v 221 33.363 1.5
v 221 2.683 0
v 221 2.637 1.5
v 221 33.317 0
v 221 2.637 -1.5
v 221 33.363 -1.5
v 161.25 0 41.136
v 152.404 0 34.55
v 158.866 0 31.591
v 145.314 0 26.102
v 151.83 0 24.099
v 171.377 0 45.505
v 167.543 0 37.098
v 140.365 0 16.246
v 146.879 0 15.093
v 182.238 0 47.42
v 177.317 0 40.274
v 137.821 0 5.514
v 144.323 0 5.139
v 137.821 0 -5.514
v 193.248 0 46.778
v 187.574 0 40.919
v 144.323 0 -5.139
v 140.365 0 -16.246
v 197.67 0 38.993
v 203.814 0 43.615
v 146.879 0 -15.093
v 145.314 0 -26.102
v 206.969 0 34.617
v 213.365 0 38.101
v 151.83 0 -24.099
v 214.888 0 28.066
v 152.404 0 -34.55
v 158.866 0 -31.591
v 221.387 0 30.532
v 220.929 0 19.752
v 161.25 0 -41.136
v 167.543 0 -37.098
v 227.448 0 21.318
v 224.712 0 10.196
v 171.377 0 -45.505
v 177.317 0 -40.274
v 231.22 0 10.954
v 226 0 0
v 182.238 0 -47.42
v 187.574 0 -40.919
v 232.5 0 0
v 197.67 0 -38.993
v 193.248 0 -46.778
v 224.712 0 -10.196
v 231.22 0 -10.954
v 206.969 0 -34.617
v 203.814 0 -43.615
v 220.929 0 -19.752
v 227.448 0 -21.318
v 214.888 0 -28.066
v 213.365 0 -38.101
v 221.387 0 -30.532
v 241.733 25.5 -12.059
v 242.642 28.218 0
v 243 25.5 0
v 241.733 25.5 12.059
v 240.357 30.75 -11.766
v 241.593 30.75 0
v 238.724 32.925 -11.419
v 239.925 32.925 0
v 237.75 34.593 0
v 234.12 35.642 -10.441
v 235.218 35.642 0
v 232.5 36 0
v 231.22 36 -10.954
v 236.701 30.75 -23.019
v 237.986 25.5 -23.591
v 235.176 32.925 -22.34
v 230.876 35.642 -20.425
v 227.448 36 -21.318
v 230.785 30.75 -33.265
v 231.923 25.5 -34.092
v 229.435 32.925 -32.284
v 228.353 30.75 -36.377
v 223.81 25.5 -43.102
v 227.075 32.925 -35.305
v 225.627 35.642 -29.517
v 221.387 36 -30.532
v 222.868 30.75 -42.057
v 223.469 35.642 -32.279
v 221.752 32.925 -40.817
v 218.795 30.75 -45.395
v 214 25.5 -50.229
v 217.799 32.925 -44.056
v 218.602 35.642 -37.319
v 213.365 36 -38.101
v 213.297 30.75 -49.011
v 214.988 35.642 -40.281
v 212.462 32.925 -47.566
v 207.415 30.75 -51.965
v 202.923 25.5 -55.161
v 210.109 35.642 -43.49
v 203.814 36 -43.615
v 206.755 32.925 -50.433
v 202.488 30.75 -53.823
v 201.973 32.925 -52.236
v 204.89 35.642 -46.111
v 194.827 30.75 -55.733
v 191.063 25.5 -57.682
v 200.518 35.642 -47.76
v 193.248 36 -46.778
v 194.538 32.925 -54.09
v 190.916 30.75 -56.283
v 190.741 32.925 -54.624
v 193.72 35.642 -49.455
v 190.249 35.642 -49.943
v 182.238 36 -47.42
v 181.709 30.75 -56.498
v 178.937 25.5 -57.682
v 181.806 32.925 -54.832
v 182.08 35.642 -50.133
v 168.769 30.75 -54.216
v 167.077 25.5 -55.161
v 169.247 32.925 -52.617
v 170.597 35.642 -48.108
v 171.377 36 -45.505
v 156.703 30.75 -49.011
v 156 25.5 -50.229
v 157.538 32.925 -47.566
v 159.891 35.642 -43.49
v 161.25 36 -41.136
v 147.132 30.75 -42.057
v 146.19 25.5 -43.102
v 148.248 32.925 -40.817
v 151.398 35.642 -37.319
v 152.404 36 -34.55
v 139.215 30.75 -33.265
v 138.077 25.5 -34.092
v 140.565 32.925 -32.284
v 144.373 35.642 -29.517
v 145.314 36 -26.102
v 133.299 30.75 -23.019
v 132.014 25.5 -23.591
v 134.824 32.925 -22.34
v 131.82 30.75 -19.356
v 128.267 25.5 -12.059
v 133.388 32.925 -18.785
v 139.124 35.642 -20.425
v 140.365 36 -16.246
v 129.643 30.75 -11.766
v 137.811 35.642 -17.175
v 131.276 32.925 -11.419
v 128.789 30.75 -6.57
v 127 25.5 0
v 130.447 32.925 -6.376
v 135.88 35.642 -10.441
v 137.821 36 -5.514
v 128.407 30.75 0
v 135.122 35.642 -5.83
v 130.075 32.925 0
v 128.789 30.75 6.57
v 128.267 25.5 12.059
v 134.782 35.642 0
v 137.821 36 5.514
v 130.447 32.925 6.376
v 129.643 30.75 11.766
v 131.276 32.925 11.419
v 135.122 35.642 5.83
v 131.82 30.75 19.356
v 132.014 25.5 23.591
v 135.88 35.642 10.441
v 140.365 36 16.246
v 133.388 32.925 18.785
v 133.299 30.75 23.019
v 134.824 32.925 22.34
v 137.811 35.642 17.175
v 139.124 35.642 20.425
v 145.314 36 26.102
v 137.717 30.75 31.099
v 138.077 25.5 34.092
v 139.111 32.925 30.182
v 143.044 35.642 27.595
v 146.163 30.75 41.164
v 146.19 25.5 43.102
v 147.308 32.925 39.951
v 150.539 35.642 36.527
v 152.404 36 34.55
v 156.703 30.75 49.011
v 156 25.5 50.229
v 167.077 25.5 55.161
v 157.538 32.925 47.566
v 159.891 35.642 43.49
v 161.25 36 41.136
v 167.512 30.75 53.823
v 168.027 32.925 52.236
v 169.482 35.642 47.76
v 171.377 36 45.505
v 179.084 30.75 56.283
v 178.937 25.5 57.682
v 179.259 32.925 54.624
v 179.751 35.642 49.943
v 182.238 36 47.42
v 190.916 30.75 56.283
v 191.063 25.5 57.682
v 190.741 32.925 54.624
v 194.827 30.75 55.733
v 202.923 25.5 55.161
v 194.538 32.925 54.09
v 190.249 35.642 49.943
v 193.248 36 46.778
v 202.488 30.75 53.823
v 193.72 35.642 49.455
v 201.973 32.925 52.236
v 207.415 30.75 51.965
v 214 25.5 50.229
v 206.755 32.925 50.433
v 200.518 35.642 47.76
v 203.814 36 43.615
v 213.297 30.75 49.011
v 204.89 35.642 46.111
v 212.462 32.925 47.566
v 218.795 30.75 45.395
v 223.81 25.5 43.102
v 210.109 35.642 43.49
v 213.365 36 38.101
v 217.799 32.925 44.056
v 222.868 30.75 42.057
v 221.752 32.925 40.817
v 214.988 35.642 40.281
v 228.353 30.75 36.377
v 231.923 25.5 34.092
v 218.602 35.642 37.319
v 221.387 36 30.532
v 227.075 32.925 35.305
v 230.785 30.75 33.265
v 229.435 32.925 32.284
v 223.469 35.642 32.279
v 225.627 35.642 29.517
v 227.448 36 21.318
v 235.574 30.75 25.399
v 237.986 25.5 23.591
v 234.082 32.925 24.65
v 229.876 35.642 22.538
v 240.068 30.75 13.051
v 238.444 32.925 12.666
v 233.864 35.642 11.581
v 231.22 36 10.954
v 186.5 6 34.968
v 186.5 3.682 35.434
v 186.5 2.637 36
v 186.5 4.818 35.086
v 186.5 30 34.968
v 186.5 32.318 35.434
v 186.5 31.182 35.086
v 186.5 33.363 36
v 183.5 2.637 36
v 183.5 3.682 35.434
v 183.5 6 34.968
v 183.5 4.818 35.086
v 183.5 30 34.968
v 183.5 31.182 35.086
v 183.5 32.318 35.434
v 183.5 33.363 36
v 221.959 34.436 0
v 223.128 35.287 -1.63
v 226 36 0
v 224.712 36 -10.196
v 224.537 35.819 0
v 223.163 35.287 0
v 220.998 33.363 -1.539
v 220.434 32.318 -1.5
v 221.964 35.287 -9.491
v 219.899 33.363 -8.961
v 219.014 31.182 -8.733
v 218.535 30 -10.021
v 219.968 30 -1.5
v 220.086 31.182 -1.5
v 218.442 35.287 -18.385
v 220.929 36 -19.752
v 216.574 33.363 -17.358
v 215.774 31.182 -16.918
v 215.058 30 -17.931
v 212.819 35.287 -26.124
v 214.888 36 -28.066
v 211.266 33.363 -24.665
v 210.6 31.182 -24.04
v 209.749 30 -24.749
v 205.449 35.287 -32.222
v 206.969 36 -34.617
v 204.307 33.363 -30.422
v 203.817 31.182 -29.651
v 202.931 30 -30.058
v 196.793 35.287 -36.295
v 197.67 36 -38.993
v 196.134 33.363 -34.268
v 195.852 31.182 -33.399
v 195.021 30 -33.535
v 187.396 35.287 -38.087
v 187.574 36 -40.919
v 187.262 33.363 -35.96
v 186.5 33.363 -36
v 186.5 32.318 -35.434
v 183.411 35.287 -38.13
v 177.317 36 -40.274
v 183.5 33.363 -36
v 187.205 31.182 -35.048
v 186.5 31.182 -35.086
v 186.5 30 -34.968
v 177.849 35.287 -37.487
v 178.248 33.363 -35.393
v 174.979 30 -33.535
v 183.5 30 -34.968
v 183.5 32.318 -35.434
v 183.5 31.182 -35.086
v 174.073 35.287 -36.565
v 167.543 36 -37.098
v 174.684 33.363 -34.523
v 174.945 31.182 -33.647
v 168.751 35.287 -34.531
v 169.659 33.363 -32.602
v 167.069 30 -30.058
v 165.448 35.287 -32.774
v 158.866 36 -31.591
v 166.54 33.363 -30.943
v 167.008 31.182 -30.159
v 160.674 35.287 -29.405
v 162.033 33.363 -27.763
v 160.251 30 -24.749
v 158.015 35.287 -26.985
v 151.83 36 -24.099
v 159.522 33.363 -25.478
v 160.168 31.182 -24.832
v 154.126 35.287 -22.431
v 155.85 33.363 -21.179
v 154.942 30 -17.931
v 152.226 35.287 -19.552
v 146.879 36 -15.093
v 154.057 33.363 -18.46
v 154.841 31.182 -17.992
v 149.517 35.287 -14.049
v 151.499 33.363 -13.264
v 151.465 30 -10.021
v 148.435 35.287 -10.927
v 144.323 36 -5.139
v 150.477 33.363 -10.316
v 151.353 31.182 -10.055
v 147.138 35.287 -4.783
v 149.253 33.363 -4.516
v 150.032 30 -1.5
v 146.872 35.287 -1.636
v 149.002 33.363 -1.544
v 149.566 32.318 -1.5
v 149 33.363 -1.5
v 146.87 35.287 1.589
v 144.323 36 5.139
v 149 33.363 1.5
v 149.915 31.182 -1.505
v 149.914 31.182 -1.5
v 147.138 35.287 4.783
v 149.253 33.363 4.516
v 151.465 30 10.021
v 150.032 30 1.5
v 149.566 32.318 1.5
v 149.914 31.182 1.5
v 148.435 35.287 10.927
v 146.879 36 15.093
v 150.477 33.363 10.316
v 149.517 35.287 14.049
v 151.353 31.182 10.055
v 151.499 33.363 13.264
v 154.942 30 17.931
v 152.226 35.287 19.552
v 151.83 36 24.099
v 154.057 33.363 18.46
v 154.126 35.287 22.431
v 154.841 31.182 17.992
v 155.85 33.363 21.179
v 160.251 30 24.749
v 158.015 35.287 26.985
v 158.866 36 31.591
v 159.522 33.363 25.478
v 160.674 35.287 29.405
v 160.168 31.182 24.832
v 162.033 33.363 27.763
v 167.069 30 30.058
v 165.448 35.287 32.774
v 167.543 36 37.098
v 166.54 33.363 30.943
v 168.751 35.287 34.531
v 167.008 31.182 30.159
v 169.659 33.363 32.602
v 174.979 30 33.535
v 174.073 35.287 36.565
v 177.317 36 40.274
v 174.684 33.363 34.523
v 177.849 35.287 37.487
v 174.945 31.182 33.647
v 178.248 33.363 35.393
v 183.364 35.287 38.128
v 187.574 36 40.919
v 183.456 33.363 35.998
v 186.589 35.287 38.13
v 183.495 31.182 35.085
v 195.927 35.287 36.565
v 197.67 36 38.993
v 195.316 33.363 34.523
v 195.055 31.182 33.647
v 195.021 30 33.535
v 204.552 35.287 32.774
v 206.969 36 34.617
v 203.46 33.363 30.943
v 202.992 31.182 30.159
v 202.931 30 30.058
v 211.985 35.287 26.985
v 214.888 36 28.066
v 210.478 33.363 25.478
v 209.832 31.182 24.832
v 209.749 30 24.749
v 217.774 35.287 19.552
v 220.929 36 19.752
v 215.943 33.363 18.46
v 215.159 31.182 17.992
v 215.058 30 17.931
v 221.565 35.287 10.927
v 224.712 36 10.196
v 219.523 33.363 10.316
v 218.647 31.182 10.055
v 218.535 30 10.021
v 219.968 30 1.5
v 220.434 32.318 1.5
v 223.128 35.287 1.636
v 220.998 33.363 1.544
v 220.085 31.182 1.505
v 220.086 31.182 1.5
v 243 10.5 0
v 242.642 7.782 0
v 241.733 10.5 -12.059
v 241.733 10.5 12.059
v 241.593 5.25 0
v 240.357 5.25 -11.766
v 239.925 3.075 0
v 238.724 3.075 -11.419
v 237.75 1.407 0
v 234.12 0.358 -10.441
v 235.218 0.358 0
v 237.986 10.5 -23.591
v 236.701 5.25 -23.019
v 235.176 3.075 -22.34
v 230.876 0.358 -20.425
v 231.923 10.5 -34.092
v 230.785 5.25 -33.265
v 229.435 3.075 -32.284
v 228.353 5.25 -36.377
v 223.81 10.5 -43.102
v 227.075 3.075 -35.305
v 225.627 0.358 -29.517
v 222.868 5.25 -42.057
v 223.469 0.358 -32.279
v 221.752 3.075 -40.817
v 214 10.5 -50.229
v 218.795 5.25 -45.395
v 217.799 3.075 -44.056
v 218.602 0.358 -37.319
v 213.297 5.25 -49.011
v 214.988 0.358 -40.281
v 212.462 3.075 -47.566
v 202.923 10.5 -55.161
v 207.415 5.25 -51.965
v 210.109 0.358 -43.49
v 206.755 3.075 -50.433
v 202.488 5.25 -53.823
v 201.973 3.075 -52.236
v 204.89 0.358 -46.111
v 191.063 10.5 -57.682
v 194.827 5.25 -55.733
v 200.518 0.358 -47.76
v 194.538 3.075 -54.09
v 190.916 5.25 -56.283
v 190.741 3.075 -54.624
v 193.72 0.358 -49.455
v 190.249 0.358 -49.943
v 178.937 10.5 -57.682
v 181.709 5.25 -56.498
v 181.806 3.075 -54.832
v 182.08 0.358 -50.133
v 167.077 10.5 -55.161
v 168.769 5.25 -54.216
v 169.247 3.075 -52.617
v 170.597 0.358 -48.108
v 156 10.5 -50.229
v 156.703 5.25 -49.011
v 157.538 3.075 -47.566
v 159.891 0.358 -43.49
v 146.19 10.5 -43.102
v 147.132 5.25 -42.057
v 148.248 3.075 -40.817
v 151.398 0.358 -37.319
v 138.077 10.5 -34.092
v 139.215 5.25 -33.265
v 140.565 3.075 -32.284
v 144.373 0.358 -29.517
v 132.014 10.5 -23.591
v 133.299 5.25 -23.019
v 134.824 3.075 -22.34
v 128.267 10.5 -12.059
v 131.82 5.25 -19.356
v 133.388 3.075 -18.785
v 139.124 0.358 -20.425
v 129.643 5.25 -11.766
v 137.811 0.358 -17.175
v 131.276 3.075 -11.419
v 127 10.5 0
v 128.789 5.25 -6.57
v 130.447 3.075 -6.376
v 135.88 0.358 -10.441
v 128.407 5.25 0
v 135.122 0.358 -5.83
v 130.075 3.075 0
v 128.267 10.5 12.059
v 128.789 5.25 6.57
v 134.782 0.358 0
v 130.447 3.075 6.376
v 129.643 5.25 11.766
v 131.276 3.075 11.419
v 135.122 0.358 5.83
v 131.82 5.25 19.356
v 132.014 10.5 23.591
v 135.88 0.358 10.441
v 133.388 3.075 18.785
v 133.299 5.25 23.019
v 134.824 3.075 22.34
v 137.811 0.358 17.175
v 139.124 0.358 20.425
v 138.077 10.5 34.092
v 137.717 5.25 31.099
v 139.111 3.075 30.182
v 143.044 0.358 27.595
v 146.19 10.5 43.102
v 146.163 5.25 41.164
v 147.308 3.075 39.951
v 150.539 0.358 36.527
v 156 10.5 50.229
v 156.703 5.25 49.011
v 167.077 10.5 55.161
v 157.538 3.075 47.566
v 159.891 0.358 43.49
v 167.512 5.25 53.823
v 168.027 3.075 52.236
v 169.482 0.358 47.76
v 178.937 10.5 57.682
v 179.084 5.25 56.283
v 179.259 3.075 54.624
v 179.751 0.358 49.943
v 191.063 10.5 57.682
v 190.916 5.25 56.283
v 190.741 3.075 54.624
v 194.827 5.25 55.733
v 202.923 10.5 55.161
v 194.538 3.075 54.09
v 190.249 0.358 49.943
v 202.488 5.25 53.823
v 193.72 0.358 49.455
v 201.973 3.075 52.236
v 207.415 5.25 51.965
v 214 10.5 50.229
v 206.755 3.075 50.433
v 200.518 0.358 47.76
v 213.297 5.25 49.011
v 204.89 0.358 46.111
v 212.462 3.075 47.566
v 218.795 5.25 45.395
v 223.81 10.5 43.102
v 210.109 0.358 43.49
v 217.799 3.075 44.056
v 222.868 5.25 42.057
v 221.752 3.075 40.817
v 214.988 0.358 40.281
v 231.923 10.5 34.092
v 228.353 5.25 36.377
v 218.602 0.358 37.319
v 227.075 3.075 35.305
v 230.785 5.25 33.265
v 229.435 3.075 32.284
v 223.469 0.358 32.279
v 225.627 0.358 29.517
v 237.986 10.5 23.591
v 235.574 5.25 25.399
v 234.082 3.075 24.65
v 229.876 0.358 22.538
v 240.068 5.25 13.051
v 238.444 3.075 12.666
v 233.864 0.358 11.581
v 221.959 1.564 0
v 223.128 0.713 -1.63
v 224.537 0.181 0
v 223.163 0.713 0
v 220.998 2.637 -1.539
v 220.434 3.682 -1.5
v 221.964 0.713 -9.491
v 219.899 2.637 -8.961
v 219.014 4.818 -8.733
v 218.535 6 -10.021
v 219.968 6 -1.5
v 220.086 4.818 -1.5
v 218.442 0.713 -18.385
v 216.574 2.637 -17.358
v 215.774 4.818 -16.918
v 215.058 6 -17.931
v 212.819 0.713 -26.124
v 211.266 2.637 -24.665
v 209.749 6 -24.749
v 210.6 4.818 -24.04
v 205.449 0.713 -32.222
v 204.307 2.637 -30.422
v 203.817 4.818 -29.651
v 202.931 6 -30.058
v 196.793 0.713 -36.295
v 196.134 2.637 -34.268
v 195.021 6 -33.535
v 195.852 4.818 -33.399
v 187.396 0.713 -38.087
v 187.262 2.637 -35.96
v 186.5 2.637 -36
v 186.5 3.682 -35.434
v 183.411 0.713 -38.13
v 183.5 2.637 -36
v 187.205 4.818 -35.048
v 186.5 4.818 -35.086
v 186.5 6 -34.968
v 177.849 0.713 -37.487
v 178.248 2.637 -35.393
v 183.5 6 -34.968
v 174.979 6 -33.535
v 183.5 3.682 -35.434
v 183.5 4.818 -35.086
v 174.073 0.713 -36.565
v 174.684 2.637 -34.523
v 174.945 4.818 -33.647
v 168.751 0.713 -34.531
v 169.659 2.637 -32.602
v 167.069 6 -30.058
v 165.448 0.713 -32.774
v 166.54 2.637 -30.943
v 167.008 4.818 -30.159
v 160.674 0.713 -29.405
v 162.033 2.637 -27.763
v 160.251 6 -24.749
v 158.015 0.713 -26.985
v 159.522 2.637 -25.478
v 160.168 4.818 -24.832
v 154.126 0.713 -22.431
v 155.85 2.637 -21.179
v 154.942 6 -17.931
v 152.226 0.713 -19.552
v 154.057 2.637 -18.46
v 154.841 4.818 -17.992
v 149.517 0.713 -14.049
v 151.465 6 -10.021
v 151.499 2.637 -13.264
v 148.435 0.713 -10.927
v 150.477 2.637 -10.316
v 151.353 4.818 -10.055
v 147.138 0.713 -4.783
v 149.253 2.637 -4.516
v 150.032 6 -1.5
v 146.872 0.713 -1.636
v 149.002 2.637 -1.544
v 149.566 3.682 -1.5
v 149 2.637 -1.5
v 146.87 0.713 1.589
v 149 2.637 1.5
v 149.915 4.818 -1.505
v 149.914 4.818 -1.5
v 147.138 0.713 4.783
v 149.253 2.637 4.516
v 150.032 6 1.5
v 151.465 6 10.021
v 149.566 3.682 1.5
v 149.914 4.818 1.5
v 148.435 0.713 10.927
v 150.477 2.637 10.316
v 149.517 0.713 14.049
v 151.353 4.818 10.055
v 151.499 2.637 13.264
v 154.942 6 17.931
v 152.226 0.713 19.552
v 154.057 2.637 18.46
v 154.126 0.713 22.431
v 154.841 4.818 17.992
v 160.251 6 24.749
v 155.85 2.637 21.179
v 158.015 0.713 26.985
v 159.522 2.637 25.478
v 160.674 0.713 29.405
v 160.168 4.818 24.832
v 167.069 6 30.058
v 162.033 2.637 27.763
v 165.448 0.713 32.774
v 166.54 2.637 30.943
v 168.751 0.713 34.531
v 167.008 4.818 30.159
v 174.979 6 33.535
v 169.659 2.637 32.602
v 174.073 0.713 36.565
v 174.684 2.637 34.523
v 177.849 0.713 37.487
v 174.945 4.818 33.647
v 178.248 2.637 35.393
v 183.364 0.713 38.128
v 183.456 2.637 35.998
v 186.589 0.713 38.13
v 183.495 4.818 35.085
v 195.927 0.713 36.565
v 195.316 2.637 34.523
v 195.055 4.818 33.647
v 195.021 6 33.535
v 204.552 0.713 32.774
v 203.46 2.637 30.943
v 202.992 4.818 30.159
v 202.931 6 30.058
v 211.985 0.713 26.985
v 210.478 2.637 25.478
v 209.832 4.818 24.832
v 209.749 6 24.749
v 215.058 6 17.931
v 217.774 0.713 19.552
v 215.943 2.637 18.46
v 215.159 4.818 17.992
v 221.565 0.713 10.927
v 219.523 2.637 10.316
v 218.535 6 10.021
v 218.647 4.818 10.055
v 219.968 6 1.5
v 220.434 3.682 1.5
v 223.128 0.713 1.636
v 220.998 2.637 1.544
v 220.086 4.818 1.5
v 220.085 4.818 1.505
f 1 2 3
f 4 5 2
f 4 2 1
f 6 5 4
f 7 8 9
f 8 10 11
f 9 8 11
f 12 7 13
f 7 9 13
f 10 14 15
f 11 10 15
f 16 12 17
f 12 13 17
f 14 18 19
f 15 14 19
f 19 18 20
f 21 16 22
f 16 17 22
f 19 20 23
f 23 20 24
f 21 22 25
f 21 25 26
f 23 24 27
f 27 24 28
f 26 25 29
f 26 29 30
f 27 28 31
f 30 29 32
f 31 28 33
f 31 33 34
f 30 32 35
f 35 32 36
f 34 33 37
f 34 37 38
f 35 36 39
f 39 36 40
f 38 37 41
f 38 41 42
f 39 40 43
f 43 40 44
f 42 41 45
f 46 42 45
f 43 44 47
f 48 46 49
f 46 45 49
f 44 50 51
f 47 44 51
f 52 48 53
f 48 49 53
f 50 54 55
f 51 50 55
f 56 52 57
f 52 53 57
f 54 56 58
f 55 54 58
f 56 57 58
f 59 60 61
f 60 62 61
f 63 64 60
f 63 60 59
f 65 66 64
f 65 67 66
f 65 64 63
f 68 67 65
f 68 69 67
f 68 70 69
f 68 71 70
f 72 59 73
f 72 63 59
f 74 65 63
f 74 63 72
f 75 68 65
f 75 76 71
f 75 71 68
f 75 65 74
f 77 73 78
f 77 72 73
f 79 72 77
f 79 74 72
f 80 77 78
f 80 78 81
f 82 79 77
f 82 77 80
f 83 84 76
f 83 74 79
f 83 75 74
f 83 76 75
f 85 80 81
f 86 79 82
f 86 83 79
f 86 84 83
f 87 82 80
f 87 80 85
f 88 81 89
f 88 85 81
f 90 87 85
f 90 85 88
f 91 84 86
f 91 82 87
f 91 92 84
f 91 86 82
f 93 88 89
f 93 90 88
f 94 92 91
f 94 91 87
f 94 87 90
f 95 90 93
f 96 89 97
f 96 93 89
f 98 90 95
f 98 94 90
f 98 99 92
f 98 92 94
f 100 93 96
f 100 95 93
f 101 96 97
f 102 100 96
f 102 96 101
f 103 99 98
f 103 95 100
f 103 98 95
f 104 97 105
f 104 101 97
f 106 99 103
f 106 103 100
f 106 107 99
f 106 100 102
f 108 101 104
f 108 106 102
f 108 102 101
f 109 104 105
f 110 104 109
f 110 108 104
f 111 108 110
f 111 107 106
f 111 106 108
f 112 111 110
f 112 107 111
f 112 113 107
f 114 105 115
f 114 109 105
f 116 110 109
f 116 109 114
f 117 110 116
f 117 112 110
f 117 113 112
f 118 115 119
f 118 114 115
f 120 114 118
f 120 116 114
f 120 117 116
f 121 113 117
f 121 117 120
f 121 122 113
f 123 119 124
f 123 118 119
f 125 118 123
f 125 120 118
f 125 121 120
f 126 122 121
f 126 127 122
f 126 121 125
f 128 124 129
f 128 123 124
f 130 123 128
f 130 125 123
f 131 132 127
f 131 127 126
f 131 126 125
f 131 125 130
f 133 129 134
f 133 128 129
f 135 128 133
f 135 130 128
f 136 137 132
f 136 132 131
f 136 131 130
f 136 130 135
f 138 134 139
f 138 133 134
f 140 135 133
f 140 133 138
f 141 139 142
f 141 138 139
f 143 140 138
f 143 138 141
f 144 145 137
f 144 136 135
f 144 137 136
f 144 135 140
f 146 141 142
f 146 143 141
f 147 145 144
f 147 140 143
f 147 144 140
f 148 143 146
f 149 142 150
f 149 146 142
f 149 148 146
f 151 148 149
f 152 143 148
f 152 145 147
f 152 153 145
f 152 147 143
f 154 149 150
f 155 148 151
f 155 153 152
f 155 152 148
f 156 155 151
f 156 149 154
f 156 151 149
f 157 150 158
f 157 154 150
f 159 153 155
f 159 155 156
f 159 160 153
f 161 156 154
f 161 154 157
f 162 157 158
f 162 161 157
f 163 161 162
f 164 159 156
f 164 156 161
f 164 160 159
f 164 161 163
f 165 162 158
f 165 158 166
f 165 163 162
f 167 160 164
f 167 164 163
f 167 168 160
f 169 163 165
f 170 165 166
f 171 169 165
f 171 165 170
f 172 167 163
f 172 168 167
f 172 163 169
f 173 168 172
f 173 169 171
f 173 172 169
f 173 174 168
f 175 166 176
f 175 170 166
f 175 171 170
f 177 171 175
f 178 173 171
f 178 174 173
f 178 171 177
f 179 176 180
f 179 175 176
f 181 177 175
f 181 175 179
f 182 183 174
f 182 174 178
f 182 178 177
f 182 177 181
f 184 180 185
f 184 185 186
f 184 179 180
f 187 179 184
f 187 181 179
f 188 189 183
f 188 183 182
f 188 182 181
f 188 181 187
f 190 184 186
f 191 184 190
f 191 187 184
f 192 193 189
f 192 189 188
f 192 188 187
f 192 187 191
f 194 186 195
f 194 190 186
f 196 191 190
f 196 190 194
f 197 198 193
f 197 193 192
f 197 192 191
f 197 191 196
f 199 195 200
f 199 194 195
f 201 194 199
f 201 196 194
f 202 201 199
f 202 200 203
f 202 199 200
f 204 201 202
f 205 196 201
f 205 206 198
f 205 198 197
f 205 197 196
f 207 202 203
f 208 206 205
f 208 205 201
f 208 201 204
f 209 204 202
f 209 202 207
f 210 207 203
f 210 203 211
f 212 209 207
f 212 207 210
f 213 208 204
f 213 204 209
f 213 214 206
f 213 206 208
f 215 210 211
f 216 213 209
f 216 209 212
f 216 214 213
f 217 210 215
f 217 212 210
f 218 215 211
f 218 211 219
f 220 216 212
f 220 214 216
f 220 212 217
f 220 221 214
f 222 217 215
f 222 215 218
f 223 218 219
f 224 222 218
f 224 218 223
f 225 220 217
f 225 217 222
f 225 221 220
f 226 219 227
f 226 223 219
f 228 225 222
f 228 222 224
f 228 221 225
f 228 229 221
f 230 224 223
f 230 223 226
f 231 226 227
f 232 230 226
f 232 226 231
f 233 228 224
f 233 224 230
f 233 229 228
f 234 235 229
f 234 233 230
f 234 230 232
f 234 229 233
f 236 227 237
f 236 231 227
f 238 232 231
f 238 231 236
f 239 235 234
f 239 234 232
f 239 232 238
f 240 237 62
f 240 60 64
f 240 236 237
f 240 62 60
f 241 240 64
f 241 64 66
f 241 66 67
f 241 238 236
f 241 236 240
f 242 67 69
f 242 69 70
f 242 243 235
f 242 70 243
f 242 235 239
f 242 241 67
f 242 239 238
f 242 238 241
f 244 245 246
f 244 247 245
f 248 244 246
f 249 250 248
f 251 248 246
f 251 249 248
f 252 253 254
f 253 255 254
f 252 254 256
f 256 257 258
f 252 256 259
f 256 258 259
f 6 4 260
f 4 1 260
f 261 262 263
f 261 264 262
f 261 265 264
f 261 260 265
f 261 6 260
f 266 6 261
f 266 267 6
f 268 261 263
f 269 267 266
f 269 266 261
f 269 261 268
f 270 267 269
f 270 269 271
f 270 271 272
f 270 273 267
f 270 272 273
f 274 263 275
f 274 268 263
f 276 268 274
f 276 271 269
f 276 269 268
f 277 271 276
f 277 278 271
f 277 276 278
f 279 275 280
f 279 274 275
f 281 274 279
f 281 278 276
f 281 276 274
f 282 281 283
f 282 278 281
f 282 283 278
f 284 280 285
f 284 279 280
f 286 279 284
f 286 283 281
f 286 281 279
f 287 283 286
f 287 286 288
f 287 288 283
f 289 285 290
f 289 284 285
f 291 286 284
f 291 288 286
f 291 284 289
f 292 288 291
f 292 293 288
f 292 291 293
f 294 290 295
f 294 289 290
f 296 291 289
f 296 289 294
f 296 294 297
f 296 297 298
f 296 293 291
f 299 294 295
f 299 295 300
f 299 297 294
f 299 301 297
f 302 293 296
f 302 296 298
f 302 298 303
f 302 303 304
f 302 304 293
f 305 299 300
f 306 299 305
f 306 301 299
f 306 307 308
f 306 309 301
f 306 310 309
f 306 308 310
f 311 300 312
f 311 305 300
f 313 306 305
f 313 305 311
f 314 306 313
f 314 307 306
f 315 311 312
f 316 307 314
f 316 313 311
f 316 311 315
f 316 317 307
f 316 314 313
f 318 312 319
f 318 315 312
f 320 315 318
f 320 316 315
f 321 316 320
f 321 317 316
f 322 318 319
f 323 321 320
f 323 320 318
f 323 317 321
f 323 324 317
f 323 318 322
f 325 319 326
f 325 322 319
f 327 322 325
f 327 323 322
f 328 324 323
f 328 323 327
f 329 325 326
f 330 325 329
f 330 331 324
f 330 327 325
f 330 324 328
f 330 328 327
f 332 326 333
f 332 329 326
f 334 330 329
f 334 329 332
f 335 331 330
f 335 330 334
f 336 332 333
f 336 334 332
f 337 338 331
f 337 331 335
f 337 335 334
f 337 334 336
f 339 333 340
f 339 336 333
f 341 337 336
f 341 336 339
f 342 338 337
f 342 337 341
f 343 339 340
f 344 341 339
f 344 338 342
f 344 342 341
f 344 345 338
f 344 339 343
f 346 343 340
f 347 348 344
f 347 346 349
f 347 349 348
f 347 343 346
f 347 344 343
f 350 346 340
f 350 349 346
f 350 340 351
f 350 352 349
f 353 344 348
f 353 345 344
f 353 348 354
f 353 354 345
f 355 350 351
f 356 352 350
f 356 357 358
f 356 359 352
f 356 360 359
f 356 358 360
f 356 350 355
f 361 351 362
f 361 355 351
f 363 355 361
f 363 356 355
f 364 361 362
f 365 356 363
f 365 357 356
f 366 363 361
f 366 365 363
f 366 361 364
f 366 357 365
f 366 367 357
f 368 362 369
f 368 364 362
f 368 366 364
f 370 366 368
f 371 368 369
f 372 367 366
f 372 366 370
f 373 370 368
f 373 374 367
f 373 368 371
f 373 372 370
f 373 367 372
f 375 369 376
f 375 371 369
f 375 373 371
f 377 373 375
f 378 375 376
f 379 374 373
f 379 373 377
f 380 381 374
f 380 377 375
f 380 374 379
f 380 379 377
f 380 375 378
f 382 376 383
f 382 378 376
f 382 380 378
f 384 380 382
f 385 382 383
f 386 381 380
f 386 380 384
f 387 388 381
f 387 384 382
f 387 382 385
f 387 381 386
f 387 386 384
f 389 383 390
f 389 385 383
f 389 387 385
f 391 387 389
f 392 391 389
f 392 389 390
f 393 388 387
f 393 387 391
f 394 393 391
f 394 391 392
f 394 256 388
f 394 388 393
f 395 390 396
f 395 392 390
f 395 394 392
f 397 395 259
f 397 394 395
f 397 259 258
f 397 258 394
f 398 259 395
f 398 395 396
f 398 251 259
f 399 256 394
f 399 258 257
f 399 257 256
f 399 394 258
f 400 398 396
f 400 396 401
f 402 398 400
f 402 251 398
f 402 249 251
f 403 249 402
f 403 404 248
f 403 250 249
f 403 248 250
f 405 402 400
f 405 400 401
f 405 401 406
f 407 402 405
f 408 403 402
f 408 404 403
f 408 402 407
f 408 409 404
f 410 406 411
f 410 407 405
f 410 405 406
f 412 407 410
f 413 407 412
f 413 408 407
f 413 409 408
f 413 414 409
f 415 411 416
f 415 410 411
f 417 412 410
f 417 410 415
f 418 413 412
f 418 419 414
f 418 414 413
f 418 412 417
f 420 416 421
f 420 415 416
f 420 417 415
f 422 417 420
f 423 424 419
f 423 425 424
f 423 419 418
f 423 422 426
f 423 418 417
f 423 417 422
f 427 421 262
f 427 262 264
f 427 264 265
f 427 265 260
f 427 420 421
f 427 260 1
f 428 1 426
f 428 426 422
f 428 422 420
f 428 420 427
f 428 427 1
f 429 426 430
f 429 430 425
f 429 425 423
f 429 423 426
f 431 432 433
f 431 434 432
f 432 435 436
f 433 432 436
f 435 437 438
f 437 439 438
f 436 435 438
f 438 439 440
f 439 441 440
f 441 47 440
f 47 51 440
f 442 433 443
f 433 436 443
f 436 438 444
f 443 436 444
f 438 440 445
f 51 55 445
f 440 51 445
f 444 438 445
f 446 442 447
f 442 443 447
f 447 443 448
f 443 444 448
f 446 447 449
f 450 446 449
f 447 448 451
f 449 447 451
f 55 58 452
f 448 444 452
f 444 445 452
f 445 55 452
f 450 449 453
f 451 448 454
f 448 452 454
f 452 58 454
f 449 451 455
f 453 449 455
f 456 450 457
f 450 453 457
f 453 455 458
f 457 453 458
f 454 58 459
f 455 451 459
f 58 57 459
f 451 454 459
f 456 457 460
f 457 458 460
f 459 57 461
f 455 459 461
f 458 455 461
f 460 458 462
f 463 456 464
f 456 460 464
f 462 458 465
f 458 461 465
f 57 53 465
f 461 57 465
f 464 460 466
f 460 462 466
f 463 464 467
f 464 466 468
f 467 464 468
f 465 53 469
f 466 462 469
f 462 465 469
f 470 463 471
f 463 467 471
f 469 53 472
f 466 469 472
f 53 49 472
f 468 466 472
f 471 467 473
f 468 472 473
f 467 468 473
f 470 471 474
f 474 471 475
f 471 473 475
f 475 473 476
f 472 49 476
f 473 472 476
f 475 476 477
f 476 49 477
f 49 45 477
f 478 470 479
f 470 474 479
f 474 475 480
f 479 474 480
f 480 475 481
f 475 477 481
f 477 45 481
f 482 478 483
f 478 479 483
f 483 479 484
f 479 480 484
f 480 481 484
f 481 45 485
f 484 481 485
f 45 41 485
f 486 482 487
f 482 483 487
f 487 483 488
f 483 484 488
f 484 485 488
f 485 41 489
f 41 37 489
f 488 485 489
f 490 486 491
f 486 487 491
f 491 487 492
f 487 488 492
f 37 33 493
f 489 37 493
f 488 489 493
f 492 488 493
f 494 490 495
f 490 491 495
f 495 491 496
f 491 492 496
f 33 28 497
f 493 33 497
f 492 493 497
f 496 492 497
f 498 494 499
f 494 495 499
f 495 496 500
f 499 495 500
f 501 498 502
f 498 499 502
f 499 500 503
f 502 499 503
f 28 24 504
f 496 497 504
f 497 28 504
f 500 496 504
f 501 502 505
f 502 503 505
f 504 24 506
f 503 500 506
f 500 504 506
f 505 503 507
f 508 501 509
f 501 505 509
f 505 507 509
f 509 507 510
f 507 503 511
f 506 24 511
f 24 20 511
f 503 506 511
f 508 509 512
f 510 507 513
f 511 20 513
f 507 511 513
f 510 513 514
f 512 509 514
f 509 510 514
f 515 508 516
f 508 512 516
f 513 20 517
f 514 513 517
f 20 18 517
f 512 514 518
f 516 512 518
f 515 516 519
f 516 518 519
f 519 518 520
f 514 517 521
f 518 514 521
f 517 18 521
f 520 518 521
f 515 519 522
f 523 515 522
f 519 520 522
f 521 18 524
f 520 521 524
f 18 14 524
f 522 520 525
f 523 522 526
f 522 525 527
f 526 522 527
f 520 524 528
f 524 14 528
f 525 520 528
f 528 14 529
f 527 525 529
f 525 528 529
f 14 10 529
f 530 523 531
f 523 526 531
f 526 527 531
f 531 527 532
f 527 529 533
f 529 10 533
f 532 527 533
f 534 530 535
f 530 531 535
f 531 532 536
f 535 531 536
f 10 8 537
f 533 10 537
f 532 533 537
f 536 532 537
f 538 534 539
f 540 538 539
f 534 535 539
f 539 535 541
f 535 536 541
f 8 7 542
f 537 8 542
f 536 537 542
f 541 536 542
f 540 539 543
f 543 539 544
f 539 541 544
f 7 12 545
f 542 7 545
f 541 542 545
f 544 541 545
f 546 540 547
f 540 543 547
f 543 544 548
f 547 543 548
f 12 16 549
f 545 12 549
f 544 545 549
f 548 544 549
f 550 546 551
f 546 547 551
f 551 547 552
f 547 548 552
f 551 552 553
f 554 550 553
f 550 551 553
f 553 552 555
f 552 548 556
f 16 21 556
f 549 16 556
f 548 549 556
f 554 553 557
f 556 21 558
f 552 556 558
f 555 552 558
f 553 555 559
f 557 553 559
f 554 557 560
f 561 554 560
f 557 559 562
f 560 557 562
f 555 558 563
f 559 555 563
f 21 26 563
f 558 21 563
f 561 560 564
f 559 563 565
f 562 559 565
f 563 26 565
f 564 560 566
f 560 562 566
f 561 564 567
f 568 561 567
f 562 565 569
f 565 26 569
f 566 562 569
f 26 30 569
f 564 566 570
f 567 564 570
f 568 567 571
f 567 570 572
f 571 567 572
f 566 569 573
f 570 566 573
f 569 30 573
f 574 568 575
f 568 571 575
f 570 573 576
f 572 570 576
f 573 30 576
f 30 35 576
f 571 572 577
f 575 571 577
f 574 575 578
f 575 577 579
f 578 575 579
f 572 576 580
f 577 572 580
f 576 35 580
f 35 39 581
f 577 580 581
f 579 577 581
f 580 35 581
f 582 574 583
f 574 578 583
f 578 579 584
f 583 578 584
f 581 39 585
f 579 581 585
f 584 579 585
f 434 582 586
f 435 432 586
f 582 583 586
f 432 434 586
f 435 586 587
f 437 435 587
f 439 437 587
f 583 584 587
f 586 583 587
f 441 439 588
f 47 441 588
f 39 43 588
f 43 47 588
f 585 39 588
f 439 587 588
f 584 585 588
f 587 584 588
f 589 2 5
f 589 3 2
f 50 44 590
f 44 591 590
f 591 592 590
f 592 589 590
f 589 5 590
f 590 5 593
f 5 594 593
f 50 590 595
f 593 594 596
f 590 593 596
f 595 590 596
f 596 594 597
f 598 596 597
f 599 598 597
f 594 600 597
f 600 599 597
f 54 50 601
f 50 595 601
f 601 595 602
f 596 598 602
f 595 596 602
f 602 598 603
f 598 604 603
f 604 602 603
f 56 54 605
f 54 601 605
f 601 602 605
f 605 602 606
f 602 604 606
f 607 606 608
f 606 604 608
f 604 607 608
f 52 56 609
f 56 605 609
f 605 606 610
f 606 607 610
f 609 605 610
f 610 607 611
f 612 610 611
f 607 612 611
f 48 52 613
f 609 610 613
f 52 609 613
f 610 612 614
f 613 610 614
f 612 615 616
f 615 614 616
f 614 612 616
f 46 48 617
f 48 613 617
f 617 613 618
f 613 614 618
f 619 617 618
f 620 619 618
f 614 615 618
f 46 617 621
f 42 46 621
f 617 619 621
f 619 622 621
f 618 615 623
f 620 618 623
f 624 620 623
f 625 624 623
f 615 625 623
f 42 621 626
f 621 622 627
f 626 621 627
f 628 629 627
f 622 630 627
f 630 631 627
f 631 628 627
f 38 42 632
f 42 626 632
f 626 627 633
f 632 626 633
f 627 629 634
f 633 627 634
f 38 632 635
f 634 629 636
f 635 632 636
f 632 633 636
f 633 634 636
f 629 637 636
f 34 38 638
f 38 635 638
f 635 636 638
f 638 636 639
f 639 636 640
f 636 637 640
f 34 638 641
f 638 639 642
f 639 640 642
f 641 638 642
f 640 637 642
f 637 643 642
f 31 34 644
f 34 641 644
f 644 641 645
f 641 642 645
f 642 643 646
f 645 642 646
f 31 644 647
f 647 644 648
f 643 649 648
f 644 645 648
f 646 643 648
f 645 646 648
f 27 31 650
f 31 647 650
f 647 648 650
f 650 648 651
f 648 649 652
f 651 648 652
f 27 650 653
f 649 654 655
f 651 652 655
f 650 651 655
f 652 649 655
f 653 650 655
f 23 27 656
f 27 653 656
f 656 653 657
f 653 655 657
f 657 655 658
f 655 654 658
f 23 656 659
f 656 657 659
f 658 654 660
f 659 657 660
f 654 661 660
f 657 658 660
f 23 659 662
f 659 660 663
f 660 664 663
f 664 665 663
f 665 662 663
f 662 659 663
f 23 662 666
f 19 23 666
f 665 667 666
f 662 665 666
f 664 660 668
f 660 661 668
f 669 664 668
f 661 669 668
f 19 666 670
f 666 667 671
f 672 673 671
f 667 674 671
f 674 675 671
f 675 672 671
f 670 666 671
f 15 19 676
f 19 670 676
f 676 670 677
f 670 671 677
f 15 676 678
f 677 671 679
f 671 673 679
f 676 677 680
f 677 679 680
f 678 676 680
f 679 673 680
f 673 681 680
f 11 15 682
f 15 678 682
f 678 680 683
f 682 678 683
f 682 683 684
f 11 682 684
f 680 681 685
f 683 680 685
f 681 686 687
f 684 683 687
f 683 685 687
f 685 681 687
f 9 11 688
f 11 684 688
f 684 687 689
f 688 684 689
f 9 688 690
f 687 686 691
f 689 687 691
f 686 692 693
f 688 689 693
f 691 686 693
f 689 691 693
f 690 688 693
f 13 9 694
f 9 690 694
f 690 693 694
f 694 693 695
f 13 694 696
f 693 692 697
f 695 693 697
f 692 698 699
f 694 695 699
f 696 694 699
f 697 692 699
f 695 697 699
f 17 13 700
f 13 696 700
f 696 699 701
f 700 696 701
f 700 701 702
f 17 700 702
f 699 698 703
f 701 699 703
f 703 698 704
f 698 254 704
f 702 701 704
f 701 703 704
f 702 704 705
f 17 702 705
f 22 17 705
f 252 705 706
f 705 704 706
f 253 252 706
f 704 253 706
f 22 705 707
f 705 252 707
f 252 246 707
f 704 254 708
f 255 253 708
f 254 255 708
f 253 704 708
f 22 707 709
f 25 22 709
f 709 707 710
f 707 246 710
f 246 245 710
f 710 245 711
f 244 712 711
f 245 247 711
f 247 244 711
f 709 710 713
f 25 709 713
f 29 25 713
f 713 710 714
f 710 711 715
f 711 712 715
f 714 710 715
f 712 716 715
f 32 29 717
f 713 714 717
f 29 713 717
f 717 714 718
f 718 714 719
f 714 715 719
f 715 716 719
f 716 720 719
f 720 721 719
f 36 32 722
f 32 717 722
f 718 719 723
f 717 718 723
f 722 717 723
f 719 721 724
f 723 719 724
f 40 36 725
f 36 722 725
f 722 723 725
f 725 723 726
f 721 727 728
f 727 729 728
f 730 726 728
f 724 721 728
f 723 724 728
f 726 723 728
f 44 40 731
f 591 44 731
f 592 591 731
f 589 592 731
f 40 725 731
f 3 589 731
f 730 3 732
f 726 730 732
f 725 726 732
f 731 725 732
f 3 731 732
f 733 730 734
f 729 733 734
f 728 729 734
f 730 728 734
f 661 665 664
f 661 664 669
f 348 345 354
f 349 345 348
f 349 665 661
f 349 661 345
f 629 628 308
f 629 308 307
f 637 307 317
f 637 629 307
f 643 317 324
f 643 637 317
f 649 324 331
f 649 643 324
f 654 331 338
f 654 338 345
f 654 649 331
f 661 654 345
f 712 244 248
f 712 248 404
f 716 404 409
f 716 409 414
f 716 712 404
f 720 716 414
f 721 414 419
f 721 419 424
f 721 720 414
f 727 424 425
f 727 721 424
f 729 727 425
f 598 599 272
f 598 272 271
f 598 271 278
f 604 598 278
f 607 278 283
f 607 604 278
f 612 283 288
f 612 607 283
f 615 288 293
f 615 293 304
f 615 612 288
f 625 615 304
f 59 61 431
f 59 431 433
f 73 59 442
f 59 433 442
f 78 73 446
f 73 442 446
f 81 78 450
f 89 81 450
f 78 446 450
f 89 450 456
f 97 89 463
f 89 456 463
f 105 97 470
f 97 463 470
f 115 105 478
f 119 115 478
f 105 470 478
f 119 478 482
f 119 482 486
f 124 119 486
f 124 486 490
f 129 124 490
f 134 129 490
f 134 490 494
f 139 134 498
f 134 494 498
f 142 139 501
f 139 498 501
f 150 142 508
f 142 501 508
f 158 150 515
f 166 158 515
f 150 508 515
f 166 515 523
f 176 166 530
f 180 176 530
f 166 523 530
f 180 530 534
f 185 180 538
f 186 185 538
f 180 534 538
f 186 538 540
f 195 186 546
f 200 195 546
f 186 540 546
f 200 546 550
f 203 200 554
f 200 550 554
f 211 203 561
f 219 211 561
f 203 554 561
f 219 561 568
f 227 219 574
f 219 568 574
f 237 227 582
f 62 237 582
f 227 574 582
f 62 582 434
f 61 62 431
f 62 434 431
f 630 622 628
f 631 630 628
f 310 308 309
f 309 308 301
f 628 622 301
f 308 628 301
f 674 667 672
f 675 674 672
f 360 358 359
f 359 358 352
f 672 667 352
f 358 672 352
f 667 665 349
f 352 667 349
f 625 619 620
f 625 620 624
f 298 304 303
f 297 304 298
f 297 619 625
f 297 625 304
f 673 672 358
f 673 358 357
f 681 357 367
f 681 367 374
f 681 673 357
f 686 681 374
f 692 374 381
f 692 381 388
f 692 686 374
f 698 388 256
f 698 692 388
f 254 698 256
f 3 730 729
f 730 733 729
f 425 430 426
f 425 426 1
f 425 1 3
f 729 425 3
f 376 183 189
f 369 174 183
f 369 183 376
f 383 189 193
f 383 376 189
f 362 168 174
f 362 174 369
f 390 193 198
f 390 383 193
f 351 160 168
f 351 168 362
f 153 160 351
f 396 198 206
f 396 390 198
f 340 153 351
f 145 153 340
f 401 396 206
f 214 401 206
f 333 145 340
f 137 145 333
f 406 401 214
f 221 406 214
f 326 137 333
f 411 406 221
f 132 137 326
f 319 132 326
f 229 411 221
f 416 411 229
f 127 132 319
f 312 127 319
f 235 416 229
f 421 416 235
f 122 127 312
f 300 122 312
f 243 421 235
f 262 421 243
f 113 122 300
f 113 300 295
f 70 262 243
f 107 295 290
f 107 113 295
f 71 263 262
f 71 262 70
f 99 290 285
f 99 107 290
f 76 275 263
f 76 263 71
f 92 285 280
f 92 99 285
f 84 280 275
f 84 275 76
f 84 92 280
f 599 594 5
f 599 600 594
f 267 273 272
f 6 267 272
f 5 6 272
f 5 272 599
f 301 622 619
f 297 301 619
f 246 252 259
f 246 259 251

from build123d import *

# Parameters (mm, degrees)
BOX360_W          = 72
BOX360_H          = 35
BOX360_DEPTH      = 3
BOX361_W          = 3
BOX361_H          = 35
BOX361_DEPTH      = 72
CYLINDER019_R     = 35
CYLINDER019_DEPTH = 36
CYLINDER010_R     = 58
CYLINDER010_DEPTH = 36
FILLET003_R       = 10.5
FILLET012_R       = 6


with BuildPart() as cube360:
    # Box360 → Box360 (new body)
    with BuildSketch(Plane(origin=(-36, 1, -1.5), x_dir=(1, 0, 0), z_dir=(0, 0, 1))):
        with Locations((36, 17.5)):
            Rectangle(BOX360_W, BOX360_H)
    extrude(amount=BOX360_DEPTH)


with BuildPart() as fusion019:
    # Box361 → Box361 (new body)
    with BuildSketch(Plane(origin=(-1.5, 1, -36), x_dir=(1, 0, 0), z_dir=(0, 0, 1))):
        with Locations((1.5, 17.5)):
            Rectangle(BOX361_W, BOX361_H)
    extrude(amount=BOX361_DEPTH)

    # Fusion019: union Cube360
    add(cube360.part)


with BuildPart() as cylinder019:
    # Cylinder019 → Cylinder019 (new body)
    with BuildSketch(Plane(origin=(0, 0, 0), x_dir=(1, 0, 0), z_dir=(0, 1, 0))):
        Circle(CYLINDER019_R)
    extrude(amount=CYLINDER019_DEPTH)


with BuildPart() as front_wheel_inner_120mm:
    # Cylinder010 → Cylinder010 (new body)
    with BuildSketch(Plane(origin=(0, 0, 0), x_dir=(1, 0, 0), z_dir=(0, 1, 0))):
        Circle(CYLINDER010_R)
    extrude(amount=CYLINDER010_DEPTH)

    # Fillet003
    fillet003_edges = [front_wheel_inner_120mm.edges().sort_by_distance(p)[0] for p in [
        (-58, 0, 0),
        (-58, 36, 0),
    ]]
    fillet(fillet003_edges, radius=FILLET003_R)

    # Cut004026018020024: cut Cylinder019
    add(cylinder019.part, mode=Mode.SUBTRACT)

    # Fillet012
    fillet012_edges = [front_wheel_inner_120mm.edges().sort_by_distance(p)[0] for p in [
        (-35, 36, 0),
        (-35, 0, 0),
    ]]
    fillet(fillet012_edges, radius=FILLET012_R)

    # Cut004026018020025: cut Fusion019
    add(fusion019.part, mode=Mode.SUBTRACT)


with BuildPart() as front_wheel_inner_120mm_1:
    # Cut004026018020025 placement: moved
    add(front_wheel_inner_120mm.part.moved(Location((185, 0, 0))))


solid = front_wheel_inner_120mm_1.part
